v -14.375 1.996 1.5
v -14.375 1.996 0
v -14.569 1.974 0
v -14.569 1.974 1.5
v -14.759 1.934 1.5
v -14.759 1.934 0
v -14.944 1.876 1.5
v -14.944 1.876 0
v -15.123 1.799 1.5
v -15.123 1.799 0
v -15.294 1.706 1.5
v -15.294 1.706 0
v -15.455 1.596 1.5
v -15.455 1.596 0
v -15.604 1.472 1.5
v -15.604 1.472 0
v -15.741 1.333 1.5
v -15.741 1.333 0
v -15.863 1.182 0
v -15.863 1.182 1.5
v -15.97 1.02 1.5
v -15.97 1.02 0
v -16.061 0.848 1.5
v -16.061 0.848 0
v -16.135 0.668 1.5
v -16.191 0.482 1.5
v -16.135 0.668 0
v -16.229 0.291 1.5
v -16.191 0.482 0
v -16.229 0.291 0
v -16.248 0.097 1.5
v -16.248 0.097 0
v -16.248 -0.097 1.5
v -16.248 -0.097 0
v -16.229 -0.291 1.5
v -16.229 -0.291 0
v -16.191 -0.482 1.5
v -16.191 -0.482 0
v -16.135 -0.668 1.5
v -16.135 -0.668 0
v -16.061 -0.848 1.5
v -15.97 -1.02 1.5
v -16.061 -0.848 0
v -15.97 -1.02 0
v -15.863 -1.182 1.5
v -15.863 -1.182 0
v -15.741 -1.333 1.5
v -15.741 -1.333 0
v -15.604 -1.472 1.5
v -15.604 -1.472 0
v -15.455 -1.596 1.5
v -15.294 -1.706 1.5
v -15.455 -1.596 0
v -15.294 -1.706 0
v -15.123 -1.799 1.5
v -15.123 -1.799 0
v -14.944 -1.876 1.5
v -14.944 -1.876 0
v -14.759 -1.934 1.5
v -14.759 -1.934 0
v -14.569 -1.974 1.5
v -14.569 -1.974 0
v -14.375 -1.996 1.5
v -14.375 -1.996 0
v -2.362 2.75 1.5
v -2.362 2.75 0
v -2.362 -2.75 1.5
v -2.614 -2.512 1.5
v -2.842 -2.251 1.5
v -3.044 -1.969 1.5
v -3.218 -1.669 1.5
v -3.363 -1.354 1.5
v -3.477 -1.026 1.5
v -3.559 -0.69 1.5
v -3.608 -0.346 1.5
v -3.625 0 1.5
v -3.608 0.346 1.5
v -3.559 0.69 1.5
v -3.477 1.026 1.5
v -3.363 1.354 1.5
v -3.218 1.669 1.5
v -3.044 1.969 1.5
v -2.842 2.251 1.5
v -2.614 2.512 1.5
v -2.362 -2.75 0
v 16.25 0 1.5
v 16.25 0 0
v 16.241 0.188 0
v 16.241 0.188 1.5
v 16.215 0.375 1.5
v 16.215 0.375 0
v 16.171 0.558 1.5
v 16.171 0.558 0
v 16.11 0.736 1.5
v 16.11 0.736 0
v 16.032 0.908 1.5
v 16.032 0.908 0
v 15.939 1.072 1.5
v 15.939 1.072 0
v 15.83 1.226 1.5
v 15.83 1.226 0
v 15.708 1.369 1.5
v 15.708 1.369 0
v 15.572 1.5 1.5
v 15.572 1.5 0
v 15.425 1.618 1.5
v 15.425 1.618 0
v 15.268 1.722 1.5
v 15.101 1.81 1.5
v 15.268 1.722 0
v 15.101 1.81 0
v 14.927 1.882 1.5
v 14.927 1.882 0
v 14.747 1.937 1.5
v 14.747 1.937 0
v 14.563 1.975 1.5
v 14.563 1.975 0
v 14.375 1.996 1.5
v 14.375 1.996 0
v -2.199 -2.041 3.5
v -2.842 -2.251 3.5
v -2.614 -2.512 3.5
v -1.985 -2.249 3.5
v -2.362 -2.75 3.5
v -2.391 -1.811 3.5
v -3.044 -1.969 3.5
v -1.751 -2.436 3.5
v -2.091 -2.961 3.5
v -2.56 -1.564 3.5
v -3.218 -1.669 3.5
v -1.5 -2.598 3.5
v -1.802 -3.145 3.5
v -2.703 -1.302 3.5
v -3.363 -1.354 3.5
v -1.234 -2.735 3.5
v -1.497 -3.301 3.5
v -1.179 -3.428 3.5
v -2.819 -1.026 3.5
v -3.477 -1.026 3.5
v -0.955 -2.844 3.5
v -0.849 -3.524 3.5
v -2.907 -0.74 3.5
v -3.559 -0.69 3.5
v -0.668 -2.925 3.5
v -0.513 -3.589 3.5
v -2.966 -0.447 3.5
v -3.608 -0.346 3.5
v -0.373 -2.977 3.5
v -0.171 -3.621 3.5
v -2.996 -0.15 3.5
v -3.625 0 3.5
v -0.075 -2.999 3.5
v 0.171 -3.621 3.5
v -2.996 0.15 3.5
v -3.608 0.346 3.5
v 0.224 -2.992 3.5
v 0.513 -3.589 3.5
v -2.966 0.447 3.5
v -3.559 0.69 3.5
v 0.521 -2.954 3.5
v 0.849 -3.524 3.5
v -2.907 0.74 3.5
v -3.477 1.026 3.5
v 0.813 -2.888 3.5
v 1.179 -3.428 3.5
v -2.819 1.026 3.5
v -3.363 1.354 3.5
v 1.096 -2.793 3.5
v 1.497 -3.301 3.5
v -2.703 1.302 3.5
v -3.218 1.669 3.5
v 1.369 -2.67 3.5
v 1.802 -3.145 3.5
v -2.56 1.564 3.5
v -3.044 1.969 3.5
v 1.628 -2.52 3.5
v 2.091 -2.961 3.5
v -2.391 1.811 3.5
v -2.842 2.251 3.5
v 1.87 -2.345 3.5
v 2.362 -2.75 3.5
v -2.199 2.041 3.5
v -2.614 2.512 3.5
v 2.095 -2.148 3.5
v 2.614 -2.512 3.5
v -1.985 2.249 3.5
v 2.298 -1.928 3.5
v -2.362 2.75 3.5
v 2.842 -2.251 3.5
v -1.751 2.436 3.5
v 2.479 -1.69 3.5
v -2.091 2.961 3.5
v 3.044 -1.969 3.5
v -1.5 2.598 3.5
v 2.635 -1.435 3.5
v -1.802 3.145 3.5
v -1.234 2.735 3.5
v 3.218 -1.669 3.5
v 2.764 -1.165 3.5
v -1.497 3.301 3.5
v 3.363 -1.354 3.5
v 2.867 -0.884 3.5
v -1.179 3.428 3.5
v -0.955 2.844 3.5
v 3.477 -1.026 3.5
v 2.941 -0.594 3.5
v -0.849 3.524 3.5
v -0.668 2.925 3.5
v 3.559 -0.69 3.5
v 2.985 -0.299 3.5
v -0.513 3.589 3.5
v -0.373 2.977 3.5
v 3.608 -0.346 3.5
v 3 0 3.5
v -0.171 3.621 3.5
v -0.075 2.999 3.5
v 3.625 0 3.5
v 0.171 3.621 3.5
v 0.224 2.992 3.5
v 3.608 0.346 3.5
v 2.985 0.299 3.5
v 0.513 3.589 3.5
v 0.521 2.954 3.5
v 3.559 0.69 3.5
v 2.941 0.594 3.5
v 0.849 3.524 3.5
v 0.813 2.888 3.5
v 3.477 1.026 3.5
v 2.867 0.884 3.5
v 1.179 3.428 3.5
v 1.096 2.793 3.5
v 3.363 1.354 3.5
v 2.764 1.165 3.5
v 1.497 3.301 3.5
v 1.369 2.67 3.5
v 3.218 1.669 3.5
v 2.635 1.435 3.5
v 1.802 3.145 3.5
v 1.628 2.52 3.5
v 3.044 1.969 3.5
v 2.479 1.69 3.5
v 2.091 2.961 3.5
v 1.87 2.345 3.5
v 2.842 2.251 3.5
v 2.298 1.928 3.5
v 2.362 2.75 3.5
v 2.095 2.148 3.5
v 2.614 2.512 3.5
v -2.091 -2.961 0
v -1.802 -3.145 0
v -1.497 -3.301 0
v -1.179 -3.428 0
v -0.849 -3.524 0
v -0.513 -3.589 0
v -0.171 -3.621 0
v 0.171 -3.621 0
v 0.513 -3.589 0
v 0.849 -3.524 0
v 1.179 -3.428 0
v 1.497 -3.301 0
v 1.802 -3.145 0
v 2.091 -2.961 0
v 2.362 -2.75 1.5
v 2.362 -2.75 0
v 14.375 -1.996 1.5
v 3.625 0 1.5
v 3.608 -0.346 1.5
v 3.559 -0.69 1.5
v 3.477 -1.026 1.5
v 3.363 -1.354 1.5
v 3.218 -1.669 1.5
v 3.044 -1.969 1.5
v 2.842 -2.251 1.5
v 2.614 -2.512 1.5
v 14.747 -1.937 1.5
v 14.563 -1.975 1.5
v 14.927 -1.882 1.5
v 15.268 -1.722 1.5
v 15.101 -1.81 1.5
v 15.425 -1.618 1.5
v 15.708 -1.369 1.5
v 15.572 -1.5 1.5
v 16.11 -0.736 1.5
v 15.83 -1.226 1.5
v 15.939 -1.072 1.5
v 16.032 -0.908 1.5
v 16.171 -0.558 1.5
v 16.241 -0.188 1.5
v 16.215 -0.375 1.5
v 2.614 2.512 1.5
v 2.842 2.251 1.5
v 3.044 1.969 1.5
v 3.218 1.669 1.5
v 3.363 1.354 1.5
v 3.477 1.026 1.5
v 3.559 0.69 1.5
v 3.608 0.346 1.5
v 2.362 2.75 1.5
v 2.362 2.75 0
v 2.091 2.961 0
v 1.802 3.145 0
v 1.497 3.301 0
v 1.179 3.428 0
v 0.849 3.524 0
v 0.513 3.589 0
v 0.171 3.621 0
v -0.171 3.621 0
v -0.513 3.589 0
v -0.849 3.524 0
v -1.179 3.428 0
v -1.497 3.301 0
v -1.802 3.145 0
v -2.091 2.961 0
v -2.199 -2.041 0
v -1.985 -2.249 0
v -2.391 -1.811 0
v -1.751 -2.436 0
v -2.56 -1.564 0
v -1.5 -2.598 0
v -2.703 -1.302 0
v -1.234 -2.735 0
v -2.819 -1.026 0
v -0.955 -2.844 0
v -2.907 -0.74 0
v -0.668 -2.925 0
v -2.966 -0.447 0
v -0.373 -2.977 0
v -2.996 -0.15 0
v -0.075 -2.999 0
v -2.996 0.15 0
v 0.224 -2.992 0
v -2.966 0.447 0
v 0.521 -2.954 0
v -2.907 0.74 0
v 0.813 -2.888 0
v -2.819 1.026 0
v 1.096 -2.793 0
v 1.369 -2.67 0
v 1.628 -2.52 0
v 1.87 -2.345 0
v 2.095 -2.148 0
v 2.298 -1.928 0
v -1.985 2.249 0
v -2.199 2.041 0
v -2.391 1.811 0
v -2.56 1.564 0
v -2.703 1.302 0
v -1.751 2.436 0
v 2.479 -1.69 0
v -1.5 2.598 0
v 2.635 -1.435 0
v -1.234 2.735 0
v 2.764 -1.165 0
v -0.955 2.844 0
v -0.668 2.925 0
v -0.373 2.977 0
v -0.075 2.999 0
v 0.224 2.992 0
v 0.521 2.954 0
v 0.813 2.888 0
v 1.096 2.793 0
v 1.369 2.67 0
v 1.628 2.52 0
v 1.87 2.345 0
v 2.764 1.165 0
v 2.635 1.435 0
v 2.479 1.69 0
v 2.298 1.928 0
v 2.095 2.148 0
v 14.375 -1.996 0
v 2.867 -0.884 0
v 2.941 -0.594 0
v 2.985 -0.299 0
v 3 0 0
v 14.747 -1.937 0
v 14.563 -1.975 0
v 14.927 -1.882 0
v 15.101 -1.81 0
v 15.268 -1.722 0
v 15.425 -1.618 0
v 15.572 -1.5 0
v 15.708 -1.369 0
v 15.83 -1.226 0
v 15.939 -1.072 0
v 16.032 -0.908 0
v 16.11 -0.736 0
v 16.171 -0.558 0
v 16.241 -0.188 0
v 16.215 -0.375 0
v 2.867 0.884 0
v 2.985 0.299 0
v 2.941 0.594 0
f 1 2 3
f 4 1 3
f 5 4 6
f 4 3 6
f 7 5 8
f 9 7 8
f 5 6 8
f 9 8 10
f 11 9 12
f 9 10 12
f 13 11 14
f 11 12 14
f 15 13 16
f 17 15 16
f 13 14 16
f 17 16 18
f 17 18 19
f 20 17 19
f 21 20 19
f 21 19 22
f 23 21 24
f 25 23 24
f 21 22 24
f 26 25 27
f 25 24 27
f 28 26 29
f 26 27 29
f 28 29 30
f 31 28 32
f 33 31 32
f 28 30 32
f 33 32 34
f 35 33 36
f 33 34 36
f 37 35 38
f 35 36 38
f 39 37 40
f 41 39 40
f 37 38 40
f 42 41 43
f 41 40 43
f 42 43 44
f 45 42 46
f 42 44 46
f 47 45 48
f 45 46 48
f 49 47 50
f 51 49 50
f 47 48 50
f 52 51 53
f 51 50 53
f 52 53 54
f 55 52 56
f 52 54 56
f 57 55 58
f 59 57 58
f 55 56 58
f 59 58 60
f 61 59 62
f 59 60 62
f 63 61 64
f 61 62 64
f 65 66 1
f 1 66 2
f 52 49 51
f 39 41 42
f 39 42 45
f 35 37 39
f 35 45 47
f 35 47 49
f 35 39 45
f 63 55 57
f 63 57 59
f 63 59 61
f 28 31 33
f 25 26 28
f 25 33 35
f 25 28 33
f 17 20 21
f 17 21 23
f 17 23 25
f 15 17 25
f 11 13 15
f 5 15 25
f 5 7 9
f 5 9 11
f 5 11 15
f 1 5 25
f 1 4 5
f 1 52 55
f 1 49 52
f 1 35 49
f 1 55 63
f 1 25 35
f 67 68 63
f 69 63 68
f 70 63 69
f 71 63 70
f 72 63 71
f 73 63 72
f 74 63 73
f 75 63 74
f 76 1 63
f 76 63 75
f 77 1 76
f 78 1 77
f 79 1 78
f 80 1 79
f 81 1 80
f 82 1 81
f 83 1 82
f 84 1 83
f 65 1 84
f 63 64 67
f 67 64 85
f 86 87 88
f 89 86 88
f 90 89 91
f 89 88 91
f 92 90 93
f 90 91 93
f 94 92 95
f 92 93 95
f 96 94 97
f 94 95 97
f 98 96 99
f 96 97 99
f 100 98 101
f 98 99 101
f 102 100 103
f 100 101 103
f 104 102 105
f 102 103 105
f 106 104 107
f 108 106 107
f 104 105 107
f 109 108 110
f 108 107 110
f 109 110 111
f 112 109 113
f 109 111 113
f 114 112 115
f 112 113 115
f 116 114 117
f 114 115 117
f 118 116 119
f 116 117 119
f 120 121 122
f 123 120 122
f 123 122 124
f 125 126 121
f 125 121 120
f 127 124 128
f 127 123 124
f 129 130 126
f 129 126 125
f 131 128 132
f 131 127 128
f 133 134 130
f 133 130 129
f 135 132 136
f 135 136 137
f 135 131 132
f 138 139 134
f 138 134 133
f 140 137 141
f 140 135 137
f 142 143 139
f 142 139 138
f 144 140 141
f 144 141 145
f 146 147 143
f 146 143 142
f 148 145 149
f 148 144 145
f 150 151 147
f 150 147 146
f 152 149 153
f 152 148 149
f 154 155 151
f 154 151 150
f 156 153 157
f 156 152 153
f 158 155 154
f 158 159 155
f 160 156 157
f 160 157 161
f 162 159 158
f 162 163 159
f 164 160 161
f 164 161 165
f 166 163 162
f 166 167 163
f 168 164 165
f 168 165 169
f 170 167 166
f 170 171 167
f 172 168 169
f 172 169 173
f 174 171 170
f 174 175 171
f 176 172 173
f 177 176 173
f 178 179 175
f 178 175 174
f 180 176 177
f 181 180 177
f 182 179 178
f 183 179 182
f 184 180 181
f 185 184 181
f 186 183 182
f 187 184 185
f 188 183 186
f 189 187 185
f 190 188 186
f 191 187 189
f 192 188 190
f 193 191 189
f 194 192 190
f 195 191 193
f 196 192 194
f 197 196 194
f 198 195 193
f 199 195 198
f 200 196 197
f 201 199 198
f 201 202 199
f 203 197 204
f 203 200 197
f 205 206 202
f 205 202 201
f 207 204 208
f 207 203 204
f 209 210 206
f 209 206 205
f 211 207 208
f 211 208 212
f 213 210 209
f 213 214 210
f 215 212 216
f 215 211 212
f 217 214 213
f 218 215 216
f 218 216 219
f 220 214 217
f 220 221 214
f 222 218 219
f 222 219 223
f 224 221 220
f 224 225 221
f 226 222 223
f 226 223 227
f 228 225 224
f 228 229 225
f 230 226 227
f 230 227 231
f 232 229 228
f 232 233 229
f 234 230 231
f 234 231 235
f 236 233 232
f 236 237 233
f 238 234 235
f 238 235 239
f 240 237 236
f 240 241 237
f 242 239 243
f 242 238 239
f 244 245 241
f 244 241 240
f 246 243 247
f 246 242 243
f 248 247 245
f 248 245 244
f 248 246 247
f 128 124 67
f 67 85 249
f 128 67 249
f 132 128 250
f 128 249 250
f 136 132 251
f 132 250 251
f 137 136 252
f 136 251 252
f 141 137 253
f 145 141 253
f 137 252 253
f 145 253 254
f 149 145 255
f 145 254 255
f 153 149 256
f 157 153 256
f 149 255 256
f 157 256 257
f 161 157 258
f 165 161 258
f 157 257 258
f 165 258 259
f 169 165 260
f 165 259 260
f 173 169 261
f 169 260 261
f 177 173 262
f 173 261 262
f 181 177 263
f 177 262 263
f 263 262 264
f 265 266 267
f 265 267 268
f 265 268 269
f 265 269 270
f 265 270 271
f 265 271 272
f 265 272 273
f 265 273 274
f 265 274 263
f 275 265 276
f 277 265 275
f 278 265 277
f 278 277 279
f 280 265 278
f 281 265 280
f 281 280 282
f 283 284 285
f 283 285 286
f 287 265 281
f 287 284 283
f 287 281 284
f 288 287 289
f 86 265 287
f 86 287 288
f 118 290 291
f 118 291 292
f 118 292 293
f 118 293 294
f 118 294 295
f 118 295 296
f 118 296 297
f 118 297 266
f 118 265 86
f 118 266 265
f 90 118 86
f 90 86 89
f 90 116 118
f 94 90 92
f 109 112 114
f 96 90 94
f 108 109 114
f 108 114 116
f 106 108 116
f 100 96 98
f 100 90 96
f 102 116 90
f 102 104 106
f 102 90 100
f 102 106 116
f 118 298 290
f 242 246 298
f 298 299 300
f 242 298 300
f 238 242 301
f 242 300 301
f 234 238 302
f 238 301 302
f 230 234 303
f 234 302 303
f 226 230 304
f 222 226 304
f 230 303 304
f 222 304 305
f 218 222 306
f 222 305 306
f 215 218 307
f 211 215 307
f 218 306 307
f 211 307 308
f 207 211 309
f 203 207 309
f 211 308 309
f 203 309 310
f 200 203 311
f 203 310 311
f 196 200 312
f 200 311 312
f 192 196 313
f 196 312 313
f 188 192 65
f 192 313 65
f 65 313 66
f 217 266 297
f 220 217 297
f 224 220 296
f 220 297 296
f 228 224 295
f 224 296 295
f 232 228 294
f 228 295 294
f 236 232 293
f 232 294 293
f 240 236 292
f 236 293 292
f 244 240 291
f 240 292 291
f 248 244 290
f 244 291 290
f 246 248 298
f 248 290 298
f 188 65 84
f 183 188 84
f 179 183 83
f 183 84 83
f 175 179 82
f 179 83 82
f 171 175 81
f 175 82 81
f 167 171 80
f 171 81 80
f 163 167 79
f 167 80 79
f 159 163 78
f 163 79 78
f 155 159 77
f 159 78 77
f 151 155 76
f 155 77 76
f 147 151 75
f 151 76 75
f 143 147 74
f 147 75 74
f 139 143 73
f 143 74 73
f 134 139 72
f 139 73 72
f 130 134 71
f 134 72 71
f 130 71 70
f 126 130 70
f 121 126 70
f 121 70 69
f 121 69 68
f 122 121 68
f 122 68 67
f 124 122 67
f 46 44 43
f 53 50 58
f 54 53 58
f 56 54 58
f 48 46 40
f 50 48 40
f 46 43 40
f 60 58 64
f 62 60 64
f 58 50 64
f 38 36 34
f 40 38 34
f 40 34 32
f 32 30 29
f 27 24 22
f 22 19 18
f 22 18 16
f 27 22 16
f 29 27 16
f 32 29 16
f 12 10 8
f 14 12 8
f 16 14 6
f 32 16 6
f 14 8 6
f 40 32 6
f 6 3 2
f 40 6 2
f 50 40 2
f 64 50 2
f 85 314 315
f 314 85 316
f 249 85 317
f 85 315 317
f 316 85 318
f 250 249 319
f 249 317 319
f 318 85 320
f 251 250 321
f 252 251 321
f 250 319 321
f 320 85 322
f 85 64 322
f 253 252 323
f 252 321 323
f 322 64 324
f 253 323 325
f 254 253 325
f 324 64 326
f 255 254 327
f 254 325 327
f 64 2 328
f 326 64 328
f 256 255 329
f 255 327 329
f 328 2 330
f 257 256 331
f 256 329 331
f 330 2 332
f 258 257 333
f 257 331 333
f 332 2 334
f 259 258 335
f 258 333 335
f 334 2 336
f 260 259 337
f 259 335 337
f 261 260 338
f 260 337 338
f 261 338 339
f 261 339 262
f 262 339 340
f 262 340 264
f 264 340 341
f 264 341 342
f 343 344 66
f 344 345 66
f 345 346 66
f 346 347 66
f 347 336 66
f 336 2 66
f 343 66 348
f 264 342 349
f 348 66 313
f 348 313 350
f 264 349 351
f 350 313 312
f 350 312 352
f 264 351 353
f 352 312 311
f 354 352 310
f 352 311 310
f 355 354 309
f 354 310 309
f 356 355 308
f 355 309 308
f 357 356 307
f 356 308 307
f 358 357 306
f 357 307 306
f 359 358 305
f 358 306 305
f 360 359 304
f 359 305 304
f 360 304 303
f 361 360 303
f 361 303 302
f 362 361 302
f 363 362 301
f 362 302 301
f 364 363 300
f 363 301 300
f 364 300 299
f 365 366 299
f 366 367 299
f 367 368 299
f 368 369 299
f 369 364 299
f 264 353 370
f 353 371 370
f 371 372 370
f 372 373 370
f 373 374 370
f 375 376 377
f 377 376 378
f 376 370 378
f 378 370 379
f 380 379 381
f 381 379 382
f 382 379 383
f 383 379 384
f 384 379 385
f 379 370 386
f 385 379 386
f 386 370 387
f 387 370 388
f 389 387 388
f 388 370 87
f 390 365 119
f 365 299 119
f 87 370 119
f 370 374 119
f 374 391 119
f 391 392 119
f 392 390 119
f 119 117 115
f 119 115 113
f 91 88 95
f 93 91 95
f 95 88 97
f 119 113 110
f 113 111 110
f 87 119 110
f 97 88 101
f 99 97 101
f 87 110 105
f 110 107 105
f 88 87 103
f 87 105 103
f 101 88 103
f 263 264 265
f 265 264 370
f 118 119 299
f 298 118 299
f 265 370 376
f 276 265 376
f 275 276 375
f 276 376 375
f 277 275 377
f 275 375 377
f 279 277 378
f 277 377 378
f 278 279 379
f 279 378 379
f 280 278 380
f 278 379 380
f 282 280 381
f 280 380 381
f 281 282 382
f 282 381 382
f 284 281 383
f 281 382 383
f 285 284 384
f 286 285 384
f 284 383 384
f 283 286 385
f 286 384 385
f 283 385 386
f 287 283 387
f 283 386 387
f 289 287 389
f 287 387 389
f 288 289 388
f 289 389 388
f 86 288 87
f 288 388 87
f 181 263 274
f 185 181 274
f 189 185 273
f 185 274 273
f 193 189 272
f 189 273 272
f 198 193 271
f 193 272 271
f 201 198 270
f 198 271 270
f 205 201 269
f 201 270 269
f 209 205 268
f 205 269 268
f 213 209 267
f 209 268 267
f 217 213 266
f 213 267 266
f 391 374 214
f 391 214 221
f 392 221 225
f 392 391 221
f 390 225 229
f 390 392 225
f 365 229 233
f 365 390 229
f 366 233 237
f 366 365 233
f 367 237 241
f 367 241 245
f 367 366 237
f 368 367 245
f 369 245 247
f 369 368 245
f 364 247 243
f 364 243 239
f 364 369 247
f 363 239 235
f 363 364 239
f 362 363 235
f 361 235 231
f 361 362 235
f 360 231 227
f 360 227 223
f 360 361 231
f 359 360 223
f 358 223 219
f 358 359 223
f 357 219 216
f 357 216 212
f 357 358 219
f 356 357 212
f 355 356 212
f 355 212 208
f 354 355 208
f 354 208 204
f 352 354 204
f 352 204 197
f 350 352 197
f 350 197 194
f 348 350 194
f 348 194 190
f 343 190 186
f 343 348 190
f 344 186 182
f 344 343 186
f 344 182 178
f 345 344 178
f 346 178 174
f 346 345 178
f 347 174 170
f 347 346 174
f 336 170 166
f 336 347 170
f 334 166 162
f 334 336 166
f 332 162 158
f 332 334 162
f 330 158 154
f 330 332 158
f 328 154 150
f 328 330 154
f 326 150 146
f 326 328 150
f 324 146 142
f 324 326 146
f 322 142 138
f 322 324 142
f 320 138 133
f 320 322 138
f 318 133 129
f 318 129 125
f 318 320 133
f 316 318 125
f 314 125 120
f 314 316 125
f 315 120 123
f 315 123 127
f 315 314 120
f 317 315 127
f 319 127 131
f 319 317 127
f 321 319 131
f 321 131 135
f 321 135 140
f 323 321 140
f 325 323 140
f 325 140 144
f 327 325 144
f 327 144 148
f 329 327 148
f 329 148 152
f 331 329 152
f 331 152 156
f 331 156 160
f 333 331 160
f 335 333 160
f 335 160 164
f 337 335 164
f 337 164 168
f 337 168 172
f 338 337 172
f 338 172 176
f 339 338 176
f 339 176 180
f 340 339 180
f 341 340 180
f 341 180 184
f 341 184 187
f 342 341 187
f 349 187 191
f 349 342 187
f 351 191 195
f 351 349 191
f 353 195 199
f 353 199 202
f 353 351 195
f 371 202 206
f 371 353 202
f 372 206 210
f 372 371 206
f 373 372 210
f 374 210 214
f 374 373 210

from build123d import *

# Parameters (mm, degrees)
F0_R     = 3
F1_DEPTH = 3.5
F2_DEPTH = 1.5


with BuildPart() as f1:
    # F0 (on Top) → F1 (new body)
    with BuildSketch(Plane.XY):
        with BuildLine():
            ThreePointArc((2.361805, -2.75), (3.294098, -1.513123), (3.625, 0))
            ThreePointArc((3.625, 0), (3.294098, 1.513123), (2.361805, 2.75))
            ThreePointArc((2.361805, 2.75), (0, 3.625), (-2.361805, 2.75))
            ThreePointArc((-2.361805, 2.75), (-3.625, 0), (-2.361805, -2.75))
            ThreePointArc((-2.361805, -2.75), (0, -3.625), (2.361805, -2.75))
        make_face()
        Circle(F0_R, mode=Mode.SUBTRACT)
    extrude(amount=F1_DEPTH)

    # F0 (on Top) → F2 (join)
    with BuildSketch(Plane.XY):
        with BuildLine():
            ThreePointArc((-2.361805, -2.75), (-3.625, 0), (-2.361805, 2.75))
            Line((-2.361805, 2.75), (-14.375267, 1.996073))
            ThreePointArc((-14.375267, 1.996073), (-12.880791, 1.45783), (-12.25, 0))
            ThreePointArc((-12.25, 0), (-12.880791, -1.45783), (-14.375267, -1.996073))
            Line((-14.375267, -1.996073), (-2.361805, -2.75))
        make_face()
        with BuildLine():
            ThreePointArc((-12.25, 0), (-12.880791, 1.45783), (-14.375267, 1.996073))
            ThreePointArc((-14.375267, 1.996073), (-16.25, 0), (-14.375267, -1.996073))
            ThreePointArc((-14.375267, -1.996073), (-12.880791, -1.45783), (-12.25, 0))
        make_face()
        with BuildLine():
            ThreePointArc((2.361805, 2.75), (3.294098, 1.513123), (3.625, 0))
            ThreePointArc((3.625, 0), (3.294098, -1.513123), (2.361805, -2.75))
            Line((2.361805, -2.75), (14.375267, -1.996073))
            ThreePointArc((14.375267, -1.996073), (12.25, 0), (14.375267, 1.996073))
            Line((14.375267, 1.996073), (2.361805, 2.75))
        make_face()
        with BuildLine():
            ThreePointArc((16.25, 0), (15.70783, 1.369209), (14.375267, 1.996073))
            ThreePointArc((14.375267, 1.996073), (12.25, 0), (14.375267, -1.996073))
            ThreePointArc((14.375267, -1.996073), (15.70783, -1.369209), (16.25, 0))
        make_face()
    extrude(amount=F2_DEPTH)


solid = f1.part
